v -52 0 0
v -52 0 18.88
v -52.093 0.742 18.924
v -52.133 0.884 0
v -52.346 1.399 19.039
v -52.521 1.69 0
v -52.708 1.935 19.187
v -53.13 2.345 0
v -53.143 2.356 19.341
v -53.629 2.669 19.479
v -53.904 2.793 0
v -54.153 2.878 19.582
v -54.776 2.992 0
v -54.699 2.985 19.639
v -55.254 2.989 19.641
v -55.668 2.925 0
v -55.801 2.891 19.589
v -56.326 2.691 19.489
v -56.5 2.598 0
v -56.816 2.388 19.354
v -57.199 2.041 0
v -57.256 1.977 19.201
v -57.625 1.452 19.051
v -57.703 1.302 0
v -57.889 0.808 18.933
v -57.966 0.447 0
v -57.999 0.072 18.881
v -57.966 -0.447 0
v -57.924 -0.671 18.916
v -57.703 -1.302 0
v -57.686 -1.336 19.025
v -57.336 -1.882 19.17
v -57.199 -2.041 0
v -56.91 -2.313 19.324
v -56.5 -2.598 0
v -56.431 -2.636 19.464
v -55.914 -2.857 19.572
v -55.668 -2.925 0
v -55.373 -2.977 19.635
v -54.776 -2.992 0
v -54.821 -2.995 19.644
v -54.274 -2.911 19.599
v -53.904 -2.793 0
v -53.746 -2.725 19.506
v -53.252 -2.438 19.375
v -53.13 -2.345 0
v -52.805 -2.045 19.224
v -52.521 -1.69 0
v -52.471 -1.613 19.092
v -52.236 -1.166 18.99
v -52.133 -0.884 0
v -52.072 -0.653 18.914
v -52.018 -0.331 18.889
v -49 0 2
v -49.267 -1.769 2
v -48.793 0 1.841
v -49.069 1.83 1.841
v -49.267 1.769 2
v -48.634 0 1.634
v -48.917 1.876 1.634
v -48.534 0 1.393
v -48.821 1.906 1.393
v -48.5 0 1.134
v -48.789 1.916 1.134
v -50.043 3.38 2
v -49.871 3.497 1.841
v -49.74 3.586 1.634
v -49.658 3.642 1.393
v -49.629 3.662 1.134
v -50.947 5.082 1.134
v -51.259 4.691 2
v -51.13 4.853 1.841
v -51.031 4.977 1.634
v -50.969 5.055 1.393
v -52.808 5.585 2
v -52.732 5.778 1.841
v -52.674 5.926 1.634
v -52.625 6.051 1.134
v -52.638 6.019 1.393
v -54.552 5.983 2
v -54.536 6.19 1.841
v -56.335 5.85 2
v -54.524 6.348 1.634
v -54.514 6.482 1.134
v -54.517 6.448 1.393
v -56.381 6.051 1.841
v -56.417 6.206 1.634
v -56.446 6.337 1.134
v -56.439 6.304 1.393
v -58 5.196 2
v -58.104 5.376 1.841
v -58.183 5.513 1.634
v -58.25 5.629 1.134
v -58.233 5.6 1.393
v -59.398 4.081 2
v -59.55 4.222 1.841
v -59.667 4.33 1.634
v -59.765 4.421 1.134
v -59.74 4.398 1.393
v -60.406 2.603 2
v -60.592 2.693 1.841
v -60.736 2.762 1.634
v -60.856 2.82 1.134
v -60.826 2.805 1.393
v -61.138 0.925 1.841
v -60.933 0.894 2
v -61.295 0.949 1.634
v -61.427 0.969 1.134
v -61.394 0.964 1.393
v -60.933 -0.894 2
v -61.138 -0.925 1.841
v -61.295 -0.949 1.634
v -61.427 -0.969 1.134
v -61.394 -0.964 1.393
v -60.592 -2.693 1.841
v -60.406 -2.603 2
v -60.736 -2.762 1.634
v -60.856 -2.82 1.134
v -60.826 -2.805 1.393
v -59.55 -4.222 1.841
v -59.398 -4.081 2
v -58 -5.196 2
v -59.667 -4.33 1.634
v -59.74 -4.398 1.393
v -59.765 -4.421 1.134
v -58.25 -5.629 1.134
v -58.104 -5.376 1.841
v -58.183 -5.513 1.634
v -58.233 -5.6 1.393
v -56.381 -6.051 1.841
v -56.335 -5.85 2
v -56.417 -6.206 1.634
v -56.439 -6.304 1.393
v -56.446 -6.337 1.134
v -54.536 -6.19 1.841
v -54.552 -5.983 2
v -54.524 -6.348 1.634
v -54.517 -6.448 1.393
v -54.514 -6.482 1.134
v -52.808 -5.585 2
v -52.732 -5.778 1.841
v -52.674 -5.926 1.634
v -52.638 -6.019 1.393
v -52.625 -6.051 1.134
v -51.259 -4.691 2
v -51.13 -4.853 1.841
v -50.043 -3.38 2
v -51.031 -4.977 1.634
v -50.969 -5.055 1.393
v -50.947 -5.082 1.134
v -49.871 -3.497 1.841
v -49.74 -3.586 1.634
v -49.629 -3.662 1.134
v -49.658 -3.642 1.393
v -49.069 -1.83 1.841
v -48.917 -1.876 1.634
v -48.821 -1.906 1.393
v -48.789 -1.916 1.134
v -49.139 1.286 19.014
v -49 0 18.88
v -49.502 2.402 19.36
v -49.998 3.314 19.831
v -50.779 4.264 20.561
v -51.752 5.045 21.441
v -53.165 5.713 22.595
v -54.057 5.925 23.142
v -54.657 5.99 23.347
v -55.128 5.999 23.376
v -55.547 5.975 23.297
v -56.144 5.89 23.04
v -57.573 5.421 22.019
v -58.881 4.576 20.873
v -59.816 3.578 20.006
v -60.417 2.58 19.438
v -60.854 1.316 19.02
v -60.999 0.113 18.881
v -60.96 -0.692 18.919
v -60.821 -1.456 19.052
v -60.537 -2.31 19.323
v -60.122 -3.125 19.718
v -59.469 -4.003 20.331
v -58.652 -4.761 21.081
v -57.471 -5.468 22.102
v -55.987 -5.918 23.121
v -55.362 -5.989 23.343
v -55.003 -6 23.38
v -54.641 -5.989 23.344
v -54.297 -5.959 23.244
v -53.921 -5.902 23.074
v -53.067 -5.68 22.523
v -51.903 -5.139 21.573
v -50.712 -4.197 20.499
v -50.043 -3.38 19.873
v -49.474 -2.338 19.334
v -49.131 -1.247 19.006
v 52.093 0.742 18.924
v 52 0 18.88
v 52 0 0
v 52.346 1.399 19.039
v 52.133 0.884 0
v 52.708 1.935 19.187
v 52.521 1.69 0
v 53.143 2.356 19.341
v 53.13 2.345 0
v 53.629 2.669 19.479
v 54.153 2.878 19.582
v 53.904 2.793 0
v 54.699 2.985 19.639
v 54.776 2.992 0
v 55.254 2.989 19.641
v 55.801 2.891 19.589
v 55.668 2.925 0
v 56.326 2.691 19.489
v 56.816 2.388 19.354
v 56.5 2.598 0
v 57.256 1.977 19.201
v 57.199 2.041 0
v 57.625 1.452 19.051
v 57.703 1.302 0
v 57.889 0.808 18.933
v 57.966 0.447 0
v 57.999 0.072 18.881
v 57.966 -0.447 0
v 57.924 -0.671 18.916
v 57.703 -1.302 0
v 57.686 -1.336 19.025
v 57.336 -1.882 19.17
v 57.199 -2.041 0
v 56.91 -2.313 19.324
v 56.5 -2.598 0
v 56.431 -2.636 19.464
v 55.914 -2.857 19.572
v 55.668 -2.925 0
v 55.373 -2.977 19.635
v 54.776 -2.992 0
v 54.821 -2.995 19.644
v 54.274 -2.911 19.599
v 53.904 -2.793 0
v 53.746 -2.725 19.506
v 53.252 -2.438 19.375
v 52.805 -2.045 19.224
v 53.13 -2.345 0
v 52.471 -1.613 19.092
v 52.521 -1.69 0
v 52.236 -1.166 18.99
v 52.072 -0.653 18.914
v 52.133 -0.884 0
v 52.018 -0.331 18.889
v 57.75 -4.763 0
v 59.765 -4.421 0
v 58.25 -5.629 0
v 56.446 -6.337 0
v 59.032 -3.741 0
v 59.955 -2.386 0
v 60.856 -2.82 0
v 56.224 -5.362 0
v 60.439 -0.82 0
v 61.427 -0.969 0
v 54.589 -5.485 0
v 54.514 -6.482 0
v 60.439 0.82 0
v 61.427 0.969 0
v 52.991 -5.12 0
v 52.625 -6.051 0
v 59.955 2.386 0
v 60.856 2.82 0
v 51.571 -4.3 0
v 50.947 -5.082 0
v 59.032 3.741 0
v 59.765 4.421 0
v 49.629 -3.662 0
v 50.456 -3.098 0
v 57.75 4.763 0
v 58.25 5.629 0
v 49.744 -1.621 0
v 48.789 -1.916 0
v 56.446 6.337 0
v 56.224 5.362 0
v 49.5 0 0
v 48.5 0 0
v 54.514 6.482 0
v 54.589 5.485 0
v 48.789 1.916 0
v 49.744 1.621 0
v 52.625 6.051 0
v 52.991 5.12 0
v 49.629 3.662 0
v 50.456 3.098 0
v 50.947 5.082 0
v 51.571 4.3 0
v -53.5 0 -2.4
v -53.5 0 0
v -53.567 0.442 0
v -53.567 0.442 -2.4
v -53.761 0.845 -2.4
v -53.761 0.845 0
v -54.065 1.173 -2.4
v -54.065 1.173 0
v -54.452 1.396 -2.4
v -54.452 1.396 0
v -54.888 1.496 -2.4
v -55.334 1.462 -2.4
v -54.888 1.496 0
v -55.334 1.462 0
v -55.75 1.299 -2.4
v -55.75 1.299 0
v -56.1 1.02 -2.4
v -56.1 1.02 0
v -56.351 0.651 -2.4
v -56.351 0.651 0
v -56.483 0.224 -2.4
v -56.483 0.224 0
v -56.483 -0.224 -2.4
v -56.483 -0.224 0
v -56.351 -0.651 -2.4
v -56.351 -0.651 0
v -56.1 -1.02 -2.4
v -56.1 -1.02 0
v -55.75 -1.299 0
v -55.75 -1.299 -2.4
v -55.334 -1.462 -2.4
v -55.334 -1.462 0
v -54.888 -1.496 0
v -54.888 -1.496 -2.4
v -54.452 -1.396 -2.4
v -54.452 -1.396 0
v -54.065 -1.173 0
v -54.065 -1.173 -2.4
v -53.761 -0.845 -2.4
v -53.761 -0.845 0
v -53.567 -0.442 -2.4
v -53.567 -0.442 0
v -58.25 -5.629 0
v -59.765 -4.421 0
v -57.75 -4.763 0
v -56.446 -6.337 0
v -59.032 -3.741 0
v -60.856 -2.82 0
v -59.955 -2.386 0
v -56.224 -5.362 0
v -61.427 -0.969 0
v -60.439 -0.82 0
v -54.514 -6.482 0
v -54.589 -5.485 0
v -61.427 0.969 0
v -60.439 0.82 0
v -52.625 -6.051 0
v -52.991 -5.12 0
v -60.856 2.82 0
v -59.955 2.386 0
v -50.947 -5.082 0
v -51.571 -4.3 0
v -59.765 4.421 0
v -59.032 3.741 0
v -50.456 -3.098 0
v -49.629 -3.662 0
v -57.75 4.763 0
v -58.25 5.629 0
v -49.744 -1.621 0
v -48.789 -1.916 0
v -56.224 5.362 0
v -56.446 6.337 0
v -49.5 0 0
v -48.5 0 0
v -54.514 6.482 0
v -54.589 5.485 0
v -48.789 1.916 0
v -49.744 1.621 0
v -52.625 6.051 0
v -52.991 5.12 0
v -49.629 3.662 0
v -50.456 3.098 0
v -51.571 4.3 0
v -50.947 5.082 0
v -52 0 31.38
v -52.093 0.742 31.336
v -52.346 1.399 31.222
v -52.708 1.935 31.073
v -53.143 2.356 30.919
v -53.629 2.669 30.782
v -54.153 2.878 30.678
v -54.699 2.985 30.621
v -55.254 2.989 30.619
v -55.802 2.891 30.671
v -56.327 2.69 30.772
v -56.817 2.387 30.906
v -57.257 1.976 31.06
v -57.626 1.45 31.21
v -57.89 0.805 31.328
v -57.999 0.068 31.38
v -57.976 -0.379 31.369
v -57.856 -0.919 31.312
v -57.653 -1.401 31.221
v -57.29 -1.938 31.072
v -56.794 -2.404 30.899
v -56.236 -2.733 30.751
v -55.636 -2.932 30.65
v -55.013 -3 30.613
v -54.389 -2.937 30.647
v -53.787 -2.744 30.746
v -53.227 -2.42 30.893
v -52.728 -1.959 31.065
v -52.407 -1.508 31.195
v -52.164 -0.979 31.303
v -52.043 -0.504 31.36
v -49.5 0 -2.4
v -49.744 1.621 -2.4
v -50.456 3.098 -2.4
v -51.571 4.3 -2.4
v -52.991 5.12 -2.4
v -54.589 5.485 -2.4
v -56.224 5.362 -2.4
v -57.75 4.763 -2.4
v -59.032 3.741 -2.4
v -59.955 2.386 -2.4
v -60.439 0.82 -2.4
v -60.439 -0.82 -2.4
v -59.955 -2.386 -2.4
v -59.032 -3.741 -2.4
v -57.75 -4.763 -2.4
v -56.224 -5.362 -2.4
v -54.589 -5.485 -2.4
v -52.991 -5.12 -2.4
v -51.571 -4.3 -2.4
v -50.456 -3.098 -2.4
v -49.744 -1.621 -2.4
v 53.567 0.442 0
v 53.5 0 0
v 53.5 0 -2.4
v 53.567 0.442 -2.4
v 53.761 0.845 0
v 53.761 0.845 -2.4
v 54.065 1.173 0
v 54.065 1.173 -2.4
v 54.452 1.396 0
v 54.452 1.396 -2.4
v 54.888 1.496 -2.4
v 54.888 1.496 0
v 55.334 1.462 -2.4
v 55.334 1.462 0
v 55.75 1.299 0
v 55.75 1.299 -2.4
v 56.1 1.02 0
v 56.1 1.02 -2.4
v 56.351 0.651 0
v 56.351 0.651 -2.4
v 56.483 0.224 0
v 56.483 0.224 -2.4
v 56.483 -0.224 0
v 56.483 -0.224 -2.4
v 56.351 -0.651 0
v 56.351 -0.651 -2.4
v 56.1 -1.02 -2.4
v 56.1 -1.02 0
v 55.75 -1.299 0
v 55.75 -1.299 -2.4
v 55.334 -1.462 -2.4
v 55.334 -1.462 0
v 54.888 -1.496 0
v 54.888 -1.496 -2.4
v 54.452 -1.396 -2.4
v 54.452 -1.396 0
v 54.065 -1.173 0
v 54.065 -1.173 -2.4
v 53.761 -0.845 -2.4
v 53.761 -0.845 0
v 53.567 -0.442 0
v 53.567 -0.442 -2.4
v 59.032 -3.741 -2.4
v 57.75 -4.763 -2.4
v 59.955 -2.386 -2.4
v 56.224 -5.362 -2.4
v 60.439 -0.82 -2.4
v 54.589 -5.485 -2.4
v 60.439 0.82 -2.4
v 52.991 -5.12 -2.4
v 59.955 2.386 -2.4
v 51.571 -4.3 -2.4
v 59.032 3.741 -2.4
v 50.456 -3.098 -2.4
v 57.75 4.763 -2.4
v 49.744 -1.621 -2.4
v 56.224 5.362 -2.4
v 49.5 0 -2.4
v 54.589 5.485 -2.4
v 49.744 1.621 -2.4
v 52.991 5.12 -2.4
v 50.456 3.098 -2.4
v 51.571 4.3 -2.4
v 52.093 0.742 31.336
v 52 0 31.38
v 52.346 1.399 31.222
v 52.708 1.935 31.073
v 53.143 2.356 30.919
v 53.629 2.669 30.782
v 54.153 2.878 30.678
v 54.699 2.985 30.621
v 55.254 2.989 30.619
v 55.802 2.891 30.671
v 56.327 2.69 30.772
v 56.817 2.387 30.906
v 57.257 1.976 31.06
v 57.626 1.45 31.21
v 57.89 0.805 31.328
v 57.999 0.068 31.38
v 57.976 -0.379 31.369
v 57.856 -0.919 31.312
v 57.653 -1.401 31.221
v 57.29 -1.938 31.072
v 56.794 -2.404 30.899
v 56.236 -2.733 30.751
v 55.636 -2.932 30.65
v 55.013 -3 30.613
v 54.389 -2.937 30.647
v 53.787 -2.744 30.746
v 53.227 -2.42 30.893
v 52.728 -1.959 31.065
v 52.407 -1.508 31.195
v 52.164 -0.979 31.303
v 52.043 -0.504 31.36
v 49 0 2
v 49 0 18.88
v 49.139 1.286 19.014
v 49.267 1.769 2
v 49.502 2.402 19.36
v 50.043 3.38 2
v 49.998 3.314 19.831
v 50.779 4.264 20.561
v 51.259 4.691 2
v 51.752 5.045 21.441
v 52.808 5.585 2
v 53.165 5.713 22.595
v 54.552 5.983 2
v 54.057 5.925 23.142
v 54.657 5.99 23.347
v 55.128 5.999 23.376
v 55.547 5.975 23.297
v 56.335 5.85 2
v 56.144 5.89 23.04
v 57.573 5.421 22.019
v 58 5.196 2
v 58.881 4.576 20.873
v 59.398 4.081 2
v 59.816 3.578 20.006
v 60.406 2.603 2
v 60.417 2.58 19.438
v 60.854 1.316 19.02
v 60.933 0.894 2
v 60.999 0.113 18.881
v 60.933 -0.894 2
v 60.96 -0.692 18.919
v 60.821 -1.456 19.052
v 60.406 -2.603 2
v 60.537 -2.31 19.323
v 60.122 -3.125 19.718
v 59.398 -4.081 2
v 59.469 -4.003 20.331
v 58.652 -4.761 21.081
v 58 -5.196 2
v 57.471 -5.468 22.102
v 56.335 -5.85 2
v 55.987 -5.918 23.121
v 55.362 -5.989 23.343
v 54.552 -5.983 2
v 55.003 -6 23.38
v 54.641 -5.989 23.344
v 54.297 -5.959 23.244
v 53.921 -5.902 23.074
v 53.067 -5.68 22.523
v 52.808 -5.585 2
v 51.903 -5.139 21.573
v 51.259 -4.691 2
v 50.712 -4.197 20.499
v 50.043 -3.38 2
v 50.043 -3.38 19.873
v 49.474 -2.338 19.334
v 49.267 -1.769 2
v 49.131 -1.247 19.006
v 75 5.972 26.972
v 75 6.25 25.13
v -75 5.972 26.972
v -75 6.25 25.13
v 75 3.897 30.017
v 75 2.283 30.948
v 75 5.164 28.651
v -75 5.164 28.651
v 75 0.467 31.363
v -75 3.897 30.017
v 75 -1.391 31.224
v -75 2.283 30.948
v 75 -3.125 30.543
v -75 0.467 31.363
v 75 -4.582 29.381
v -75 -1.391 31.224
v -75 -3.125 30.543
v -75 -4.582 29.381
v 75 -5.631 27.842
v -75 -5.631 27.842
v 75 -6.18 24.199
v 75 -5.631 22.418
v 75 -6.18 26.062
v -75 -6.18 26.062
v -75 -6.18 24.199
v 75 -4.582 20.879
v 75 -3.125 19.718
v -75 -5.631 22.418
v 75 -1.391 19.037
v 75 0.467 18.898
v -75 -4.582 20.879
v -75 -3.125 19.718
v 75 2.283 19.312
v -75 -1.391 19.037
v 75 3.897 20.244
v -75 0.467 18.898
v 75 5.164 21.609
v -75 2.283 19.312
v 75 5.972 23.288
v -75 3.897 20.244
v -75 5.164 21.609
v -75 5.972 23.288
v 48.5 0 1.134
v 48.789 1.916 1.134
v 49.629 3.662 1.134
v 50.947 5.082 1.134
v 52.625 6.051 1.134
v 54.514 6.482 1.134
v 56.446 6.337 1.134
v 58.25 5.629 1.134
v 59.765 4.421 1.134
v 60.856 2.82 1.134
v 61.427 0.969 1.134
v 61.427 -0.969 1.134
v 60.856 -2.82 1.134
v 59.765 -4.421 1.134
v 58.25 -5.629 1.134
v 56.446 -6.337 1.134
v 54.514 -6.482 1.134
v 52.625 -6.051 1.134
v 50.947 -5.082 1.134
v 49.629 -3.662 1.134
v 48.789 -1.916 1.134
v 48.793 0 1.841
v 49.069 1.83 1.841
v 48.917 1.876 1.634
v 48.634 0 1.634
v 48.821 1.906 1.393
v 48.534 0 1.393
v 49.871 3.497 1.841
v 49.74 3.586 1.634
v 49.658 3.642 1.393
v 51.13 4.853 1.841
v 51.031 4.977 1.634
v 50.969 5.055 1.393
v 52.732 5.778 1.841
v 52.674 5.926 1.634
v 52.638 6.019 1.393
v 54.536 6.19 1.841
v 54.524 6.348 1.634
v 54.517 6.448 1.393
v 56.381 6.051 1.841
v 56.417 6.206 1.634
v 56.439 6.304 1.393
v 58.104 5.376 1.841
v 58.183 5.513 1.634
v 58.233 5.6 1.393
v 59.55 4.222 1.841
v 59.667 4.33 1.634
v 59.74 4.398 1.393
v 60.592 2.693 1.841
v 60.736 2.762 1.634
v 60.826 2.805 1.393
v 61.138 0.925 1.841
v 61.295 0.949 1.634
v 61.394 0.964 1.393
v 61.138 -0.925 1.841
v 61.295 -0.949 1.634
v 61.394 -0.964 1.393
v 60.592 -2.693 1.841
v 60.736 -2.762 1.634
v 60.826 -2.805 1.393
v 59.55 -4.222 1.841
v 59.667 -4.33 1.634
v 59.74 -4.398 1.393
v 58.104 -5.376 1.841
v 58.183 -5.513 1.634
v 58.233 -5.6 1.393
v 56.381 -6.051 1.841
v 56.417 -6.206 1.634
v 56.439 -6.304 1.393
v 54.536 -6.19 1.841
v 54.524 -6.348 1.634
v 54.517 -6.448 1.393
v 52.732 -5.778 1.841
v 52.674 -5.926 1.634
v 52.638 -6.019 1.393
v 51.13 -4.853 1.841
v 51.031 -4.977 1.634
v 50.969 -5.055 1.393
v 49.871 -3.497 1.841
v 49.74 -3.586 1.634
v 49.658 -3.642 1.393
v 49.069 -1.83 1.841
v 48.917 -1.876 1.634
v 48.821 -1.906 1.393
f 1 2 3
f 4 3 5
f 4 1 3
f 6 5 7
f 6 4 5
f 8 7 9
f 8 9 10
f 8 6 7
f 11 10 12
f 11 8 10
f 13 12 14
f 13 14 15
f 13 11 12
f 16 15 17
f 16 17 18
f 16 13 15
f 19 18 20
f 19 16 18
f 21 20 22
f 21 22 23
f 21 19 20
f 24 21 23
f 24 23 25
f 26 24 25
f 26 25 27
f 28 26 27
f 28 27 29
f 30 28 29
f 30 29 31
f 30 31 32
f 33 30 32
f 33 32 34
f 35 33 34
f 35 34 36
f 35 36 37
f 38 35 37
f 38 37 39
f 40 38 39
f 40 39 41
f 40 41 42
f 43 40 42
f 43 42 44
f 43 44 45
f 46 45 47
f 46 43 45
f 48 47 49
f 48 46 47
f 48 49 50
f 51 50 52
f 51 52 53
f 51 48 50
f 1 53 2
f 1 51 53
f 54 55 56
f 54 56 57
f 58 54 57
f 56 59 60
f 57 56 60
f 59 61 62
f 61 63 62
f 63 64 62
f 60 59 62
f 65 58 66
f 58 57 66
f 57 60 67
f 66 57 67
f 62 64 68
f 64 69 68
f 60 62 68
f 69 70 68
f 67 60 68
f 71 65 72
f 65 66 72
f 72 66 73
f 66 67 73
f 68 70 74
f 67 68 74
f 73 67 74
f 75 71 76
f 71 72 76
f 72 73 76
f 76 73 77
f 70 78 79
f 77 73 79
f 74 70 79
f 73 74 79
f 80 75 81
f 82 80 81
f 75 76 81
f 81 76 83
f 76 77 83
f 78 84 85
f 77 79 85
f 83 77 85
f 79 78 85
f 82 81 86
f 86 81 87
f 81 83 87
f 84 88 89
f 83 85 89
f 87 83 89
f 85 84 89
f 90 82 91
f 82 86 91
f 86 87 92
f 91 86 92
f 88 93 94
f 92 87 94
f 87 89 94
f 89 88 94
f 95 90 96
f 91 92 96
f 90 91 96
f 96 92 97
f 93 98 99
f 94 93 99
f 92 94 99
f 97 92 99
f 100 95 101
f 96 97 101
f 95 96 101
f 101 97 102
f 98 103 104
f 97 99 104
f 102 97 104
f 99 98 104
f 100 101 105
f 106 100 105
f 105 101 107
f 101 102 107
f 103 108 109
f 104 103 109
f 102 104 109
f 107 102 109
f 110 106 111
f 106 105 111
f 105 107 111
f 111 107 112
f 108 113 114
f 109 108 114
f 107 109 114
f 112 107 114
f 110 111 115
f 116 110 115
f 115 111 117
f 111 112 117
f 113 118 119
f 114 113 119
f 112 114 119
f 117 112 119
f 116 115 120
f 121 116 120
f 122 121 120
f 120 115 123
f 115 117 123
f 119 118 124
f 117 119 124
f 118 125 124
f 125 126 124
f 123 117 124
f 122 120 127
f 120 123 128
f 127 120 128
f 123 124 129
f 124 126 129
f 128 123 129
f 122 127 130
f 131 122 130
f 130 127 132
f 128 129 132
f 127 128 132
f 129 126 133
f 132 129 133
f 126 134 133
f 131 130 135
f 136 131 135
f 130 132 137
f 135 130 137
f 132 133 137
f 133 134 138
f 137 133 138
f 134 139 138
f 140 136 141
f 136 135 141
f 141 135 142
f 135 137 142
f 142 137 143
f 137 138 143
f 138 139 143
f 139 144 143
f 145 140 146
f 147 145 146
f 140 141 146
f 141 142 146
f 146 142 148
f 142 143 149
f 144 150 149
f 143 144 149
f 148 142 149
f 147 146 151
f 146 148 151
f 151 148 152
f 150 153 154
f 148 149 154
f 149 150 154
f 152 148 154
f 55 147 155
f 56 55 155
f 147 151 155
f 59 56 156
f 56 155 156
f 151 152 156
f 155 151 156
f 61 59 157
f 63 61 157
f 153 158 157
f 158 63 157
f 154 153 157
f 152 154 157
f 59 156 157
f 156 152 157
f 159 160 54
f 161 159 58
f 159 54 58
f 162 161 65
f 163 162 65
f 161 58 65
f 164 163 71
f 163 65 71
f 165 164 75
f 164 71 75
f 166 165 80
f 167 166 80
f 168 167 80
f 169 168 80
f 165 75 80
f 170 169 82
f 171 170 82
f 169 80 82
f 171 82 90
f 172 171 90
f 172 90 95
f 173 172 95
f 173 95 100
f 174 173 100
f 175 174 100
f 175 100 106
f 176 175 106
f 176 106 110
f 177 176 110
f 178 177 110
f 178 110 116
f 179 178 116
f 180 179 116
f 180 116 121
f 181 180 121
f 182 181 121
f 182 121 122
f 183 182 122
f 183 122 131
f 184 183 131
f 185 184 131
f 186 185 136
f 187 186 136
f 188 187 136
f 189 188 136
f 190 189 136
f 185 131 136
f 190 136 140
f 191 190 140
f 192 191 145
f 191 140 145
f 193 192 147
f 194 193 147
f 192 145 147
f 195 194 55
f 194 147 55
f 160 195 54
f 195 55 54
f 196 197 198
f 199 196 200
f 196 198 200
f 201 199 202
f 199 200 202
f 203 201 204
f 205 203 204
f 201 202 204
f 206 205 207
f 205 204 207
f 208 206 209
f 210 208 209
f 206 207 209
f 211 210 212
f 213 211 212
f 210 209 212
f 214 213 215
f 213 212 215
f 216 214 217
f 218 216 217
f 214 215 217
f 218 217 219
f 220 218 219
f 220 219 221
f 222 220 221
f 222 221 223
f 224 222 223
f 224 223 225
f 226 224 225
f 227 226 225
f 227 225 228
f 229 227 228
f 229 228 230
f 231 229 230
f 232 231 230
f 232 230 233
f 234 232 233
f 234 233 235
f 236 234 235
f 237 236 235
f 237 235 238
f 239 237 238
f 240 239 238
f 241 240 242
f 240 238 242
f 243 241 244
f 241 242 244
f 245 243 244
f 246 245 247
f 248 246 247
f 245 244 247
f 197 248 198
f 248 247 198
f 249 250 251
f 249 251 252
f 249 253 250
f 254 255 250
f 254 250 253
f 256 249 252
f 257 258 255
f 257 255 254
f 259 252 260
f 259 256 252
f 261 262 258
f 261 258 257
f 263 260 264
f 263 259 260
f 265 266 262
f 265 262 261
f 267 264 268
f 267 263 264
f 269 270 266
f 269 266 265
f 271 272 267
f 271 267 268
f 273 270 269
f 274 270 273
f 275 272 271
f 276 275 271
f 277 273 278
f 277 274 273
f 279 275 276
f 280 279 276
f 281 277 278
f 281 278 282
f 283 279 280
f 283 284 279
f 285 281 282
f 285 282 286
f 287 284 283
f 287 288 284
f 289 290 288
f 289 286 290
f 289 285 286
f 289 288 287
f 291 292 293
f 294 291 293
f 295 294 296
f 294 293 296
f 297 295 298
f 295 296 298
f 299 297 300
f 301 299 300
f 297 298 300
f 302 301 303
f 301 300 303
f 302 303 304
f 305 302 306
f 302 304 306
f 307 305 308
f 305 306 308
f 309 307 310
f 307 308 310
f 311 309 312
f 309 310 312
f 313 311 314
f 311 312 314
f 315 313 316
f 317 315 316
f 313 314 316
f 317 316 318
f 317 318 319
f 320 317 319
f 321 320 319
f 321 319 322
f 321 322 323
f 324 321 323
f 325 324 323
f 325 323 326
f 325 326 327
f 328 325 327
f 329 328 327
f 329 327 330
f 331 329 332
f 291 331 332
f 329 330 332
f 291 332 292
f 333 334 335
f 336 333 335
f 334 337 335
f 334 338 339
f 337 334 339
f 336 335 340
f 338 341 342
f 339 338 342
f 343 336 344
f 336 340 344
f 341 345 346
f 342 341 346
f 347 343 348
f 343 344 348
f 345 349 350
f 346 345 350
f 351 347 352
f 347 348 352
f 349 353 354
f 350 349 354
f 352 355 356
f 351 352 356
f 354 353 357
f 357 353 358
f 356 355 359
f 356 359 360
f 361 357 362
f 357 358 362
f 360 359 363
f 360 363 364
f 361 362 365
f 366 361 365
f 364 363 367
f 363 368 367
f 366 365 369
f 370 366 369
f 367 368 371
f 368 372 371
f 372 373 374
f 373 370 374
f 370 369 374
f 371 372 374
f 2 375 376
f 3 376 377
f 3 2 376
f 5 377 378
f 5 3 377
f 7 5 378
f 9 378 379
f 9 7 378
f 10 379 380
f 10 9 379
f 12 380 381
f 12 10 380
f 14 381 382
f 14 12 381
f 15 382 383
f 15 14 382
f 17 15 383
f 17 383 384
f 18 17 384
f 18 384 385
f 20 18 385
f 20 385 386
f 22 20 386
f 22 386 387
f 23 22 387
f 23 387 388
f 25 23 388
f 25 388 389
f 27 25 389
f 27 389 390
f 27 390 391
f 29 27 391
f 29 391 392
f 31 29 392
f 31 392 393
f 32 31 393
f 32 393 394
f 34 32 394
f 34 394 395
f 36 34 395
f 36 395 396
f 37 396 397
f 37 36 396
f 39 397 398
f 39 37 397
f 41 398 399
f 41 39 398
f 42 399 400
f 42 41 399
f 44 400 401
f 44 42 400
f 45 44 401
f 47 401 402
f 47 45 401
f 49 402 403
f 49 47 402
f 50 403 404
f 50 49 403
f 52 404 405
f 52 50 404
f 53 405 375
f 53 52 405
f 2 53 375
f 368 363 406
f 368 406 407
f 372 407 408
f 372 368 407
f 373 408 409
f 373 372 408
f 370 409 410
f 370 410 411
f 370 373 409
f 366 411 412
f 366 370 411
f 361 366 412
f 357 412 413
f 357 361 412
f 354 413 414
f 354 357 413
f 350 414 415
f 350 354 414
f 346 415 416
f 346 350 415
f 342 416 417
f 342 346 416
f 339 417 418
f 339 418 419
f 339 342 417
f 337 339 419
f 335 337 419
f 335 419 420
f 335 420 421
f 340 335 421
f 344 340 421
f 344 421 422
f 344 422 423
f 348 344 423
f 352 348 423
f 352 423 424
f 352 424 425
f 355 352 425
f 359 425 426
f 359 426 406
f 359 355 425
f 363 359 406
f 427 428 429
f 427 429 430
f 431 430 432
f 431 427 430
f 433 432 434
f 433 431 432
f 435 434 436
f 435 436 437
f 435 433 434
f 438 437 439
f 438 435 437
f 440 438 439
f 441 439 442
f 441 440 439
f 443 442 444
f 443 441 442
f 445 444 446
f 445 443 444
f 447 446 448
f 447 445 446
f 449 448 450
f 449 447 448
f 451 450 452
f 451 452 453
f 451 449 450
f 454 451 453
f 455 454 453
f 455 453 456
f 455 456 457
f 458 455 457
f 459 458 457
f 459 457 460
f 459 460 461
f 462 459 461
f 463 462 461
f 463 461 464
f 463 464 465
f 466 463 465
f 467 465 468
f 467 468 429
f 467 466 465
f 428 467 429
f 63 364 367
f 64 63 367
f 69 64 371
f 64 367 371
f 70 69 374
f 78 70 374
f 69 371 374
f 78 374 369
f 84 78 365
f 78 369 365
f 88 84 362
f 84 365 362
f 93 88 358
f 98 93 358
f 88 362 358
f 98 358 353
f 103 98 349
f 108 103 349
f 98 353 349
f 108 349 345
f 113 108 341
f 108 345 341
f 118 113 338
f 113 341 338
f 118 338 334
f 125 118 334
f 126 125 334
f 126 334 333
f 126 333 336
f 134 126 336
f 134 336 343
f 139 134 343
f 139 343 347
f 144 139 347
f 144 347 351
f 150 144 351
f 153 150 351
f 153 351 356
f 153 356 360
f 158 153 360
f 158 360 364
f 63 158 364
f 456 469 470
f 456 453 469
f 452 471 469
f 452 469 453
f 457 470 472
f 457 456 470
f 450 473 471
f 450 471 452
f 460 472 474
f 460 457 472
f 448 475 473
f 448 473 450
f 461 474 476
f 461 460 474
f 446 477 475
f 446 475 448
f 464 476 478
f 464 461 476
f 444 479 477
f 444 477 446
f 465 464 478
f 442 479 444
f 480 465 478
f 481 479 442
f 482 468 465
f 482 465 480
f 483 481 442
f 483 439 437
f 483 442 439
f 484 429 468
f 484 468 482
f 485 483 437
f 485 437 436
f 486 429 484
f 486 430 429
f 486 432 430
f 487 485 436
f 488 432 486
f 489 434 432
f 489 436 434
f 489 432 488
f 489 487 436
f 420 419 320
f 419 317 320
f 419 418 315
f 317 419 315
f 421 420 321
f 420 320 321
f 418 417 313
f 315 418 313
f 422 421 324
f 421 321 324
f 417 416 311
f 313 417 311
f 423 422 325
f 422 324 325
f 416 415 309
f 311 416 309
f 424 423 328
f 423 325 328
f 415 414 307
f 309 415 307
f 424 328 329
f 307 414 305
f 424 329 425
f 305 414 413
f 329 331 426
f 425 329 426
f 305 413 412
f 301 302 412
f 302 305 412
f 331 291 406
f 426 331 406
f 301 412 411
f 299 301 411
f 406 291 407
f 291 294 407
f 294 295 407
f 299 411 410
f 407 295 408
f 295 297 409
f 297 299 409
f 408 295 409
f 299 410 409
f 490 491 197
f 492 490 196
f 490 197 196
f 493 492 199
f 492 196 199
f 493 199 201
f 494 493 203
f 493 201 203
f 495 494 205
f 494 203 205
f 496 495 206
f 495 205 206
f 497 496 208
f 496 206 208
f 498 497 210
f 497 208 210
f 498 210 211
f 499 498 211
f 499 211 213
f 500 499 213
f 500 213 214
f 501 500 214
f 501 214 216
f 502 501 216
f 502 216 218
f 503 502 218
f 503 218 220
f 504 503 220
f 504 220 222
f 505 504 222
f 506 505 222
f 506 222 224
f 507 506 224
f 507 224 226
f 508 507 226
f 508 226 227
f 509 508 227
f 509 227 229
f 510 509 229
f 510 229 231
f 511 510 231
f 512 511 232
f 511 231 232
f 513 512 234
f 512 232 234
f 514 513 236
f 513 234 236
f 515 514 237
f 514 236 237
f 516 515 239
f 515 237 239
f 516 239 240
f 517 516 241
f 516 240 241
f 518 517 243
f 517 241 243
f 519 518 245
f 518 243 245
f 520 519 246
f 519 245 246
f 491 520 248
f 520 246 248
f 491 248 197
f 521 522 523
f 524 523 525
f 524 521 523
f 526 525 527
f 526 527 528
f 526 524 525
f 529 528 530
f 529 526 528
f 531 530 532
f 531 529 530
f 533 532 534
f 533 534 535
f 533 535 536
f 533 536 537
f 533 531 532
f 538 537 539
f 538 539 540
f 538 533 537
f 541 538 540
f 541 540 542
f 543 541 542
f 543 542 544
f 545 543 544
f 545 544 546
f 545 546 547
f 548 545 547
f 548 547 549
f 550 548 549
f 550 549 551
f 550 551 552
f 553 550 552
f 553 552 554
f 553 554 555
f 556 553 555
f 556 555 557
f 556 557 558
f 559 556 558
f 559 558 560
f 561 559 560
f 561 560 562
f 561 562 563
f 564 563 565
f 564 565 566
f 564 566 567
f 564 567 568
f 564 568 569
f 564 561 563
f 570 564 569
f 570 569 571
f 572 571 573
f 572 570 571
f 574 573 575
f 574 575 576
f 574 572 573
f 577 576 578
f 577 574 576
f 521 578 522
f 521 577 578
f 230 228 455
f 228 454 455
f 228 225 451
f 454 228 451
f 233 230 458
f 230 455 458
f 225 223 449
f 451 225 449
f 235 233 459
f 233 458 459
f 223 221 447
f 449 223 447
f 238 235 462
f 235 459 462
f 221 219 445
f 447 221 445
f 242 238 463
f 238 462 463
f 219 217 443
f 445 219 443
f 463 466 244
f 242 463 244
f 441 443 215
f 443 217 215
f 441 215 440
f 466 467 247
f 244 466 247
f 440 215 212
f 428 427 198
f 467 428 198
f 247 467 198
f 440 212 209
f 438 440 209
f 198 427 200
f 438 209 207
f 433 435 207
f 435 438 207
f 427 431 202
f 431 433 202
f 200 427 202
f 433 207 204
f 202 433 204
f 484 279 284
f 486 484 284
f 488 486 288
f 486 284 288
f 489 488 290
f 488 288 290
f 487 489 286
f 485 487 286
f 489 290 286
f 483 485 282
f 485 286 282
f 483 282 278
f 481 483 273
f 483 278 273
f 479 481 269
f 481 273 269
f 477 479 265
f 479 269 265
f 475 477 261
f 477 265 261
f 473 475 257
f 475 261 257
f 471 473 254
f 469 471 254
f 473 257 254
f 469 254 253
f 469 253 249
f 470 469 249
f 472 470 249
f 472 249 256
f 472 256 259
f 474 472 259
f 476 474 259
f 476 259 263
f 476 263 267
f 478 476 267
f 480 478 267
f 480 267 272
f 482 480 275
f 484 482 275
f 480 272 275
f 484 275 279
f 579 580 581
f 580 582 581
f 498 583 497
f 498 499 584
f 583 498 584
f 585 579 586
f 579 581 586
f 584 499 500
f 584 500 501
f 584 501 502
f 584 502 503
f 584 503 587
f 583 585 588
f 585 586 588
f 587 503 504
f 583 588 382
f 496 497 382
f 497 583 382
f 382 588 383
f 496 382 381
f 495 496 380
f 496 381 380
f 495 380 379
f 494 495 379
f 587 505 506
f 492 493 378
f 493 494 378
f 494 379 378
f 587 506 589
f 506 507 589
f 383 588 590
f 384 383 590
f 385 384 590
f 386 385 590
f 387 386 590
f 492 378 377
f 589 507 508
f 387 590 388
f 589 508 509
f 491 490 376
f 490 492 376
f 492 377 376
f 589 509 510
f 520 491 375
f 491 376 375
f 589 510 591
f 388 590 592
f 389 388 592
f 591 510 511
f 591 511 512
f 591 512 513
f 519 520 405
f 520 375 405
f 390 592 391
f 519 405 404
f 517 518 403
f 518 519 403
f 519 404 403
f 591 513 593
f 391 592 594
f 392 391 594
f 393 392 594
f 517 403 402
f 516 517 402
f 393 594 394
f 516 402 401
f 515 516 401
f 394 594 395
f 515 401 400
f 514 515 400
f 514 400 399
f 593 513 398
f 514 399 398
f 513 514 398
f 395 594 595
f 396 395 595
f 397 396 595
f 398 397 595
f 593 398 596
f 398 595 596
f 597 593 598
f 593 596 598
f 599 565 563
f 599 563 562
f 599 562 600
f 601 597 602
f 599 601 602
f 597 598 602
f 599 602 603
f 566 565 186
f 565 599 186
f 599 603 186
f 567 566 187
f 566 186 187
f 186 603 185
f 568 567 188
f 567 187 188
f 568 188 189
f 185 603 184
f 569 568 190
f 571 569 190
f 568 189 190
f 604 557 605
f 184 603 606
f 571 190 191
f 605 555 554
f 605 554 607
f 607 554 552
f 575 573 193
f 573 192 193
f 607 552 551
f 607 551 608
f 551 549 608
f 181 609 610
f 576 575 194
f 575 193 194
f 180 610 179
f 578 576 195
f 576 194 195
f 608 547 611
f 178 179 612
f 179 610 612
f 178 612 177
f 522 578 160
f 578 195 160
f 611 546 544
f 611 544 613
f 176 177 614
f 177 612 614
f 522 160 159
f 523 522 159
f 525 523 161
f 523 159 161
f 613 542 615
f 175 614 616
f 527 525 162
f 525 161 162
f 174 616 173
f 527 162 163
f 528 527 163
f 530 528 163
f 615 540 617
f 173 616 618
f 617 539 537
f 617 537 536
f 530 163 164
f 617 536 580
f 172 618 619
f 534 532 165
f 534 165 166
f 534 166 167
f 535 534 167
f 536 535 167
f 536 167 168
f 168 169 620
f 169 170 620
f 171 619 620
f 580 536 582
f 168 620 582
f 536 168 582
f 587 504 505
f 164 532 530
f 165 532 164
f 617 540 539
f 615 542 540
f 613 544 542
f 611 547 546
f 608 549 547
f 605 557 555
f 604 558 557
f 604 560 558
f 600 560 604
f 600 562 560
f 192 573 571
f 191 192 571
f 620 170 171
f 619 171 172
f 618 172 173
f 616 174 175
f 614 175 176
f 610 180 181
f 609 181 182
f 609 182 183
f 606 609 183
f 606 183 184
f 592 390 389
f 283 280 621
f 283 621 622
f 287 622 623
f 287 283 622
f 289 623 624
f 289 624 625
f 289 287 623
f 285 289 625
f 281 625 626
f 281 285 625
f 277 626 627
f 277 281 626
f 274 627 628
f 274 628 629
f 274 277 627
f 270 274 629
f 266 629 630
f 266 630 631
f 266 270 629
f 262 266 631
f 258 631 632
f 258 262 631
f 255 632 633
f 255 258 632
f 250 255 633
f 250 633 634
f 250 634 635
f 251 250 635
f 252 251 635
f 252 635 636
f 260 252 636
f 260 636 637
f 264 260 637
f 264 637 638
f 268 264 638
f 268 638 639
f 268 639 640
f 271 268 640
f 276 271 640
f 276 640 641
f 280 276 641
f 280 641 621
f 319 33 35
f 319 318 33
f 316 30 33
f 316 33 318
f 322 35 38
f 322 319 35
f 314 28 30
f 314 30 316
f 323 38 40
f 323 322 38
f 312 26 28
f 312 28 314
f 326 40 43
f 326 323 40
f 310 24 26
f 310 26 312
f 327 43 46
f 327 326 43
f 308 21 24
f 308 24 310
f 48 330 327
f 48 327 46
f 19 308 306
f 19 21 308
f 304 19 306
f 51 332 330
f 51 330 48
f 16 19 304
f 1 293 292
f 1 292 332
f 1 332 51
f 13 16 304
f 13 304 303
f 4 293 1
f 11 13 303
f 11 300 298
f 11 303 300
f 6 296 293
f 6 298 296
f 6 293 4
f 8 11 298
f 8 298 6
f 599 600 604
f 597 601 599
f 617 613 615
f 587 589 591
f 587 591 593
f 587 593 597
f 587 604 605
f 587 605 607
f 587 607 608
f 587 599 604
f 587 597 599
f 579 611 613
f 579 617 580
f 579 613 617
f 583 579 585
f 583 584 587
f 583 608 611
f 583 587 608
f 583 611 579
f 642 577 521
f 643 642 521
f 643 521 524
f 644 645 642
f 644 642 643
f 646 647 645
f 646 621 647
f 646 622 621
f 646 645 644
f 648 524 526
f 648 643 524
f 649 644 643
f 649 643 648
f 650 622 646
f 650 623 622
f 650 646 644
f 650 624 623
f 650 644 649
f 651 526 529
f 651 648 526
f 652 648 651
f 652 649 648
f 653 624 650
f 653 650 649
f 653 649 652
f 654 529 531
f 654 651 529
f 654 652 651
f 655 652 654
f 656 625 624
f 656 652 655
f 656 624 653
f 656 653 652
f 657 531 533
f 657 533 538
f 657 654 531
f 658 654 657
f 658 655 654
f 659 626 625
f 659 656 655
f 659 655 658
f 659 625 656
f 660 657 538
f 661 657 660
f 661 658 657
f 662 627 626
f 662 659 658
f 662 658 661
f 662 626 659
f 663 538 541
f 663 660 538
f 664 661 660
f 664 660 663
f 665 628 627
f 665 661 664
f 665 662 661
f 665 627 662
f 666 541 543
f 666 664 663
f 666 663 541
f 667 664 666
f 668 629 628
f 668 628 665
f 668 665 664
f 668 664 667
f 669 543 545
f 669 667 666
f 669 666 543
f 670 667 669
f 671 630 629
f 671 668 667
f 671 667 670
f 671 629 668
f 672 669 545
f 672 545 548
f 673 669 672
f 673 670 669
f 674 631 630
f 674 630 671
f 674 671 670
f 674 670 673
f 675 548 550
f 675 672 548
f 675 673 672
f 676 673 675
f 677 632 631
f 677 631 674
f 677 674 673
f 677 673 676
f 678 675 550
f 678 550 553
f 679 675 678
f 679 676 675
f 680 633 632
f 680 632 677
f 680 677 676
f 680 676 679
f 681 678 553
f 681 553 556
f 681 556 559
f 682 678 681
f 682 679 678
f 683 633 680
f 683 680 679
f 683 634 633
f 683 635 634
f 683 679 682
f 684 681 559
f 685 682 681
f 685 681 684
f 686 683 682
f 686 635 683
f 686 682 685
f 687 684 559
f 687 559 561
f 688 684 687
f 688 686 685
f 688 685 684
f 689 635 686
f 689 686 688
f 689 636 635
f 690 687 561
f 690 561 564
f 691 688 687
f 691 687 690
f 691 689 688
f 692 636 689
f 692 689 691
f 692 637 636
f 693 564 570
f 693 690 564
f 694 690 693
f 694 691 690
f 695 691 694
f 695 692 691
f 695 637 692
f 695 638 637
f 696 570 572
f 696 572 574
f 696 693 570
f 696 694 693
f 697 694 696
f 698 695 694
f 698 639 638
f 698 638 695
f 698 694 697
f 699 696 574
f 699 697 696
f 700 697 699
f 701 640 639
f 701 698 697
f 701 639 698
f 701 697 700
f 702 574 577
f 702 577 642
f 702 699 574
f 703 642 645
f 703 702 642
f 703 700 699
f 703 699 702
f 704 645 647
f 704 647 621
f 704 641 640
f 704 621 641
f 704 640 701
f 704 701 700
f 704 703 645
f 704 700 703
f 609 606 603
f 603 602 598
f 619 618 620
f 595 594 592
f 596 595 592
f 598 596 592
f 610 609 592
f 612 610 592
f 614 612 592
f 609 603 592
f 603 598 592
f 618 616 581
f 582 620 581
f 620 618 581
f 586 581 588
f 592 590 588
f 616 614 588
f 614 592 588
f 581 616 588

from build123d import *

# Parameters (mm, degrees)
F0_R     = 6
F0_R_2   = 5.5
F0_R_3   = 3
F1_DEPTH = 25
F0_R_4   = 6.5
F2_DEPTH = 2
F0_R_5   = 1.5
F3_DEPTH = 2.4
F4_R     = 6.25
F5_DEPTH = 75
F6_DEPTH = 40


# Not quite as in the source:
# - a fillet or chamfer that OpenCascade refuses, or shapes differently, is made with other operations: its cross-section is extruded or revolved along the edge and cut away or added


with BuildPart() as f1:
    # F0 (on Top) → F1 (new body)
    with BuildSketch(Plane.XY):
        with Locations((-55, 0)):
            Circle(F0_R)
        with Locations((-55, 0)):
            Circle(F0_R_2, mode=Mode.SUBTRACT)
        with Locations((-55, 0)):
            Circle(F0_R_2)
        with Locations((-55, 0)):
            Circle(F0_R_3, mode=Mode.SUBTRACT)
    extrude(amount=F1_DEPTH)

    # F0 (on Top) → F2 (join)
    with BuildSketch(Plane.XY):
        with Locations((-55, 0)):
            Circle(F0_R_4)
        with Locations((-55, 0)):
            Circle(F0_R, mode=Mode.SUBTRACT)
    extrude(amount=F2_DEPTH)

    # F0 (on Top) → F3 (join)
    with BuildSketch(Plane.XY):
        with Locations((-55, 0)):
            Circle(F0_R_2)
        with Locations((-55, 0)):
            Circle(F0_R_3, mode=Mode.SUBTRACT)
        with Locations((-55, 0)):
            Circle(F0_R_3)
        with Locations((-55, 0)):
            Circle(F0_R_5, mode=Mode.SUBTRACT)
    extrude(amount=-F3_DEPTH)

    # F4 (on Right) → F5 (join)
    with BuildSketch(Plane.YZ):
        with Locations((0, 25.1302048564)):
            Circle(F4_R)
    extrude(amount=-F5_DEPTH)

    # F0 (on Top) → F6 (cut)
    with BuildSketch(Plane.XY):
        with Locations((-55, 0)):
            Circle(F0_R_3)
        with Locations((-55, 0)):
            Circle(F0_R_5, mode=Mode.SUBTRACT)
        with Locations((-55, 0)):
            Circle(F0_R_5)
    extrude(amount=F6_DEPTH, mode=Mode.SUBTRACT)

    # F7: fillet of radius 1 on 1 edges, made by hand

    # F7_s1 → F7_t2 (revolve, cut)
    with BuildSketch(Plane.XZ):
        with BuildLine():
            ThreePointArc((-49, 2), (-48.6339745962, 1.6339745962), (-48.5, 1.1339745962))
            Line((-48.5, 1.1339745962), (-48.5, 2))
            Line((-48.5, 2), (-49, 2))
        make_face()
    revolve(axis=Axis((-55, 0, 2), (0, 0, 1)), mode=Mode.SUBTRACT)

    # F8: F1 across plane


with BuildPart() as f1_1:
    add(f1.part)
    add(f1.part.mirror(Plane.YZ))


solid = f1_1.part
